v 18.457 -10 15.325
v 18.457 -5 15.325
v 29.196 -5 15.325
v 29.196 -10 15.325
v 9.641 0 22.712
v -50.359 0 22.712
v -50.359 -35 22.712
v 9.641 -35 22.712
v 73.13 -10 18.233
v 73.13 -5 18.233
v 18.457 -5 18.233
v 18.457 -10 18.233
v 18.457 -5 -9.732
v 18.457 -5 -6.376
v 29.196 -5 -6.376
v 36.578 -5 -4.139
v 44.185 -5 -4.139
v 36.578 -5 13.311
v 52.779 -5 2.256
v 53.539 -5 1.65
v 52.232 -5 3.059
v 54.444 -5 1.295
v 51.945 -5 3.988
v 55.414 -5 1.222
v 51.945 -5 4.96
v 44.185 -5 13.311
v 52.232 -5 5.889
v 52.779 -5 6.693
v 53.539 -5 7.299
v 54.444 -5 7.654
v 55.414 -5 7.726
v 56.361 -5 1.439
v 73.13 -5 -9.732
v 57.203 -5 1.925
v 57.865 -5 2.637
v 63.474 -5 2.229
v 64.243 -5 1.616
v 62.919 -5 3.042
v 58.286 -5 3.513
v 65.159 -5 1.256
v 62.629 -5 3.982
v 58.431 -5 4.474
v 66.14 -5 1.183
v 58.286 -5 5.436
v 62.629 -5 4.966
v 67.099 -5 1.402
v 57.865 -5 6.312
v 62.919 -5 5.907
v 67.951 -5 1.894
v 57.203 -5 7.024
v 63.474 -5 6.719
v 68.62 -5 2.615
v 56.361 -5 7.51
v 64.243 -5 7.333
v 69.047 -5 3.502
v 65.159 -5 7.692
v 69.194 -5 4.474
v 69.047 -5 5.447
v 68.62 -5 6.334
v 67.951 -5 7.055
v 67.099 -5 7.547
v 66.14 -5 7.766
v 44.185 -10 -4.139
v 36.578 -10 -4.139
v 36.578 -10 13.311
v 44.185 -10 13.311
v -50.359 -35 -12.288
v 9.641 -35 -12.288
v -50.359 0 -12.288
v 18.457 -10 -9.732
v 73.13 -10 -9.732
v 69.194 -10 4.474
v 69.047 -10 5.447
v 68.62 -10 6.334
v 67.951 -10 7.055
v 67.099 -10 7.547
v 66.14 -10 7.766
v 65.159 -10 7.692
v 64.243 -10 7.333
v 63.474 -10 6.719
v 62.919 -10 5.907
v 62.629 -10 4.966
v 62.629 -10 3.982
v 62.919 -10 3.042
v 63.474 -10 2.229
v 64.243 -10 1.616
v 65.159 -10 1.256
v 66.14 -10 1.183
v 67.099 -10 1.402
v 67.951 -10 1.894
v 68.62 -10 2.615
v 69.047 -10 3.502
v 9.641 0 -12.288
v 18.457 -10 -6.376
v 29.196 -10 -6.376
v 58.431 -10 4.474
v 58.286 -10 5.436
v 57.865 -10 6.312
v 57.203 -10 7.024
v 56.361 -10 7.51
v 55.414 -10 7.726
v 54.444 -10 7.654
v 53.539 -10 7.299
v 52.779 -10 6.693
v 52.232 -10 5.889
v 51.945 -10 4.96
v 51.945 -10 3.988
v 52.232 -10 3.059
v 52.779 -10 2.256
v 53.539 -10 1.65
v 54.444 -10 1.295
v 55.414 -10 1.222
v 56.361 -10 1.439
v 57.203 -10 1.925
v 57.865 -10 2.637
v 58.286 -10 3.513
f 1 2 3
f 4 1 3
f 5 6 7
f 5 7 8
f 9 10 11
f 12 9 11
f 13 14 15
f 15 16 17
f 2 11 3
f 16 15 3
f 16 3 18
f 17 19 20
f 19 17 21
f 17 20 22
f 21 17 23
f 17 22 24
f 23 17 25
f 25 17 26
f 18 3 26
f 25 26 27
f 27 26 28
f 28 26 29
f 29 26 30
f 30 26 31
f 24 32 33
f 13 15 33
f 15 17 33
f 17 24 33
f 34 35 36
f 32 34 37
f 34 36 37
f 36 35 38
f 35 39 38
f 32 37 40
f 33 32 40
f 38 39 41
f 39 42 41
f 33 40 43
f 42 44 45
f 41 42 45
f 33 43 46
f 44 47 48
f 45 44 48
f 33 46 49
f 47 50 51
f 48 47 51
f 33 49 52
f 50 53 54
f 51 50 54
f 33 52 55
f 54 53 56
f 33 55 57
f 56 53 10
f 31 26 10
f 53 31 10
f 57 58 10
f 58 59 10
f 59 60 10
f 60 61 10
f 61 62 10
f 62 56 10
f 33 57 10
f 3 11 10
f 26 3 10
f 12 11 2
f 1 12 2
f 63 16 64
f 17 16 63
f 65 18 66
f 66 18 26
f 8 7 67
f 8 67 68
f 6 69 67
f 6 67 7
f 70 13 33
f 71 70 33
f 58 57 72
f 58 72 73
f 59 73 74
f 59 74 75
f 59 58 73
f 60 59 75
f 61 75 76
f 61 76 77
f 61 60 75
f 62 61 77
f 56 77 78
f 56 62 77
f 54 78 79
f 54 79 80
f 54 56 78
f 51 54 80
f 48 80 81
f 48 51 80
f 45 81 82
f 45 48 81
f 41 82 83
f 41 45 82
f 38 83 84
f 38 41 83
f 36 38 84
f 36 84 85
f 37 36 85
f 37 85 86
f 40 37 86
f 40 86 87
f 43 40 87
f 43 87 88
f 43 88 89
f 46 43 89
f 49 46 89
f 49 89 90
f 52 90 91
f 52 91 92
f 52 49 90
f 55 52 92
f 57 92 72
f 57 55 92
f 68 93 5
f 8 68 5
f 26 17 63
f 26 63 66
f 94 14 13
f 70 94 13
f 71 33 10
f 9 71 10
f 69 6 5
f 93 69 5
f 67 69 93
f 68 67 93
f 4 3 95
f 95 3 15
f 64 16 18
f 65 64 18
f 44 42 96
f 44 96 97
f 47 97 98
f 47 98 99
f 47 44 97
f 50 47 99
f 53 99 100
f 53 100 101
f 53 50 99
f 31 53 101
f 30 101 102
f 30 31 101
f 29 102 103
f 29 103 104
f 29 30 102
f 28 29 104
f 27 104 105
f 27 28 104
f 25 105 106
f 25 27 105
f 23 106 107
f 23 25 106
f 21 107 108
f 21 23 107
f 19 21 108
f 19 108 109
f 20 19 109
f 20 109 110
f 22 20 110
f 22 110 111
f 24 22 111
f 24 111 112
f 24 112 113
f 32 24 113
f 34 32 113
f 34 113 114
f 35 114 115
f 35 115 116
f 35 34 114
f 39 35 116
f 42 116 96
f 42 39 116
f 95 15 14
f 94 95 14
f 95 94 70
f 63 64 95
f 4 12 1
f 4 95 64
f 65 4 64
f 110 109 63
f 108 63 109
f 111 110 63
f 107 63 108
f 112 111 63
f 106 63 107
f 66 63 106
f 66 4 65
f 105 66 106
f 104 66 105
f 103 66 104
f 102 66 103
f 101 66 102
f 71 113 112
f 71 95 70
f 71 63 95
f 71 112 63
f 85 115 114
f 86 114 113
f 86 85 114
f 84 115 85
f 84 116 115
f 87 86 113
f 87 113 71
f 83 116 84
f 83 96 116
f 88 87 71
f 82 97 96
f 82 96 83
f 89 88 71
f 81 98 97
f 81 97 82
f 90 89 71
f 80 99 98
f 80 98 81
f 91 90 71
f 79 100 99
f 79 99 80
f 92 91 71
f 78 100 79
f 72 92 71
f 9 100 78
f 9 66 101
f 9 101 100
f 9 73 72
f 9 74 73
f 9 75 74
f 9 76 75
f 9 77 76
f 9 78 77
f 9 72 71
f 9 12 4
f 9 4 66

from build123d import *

# Parameters (mm, degrees)
F0_W     = 60
F0_H     = 35
F1_DEPTH = 35
F3_W     = 7.606529
F3_H     = 17.450285
F3_R     = 3.261164
F3_R_2   = 3.300731
F4_DEPTH = 5


with BuildPart() as f1:
    # F0 (on Front) → F1 (new body)
    with BuildSketch(Plane.XZ):
        with Locations((-20.358665, 5.211844)):
            Rectangle(F0_W, F0_H)
    extrude(amount=F1_DEPTH)


with BuildPart() as f4:
    # F3 (on offset) → F4 (new body)
    with BuildSketch(Plane.XZ.offset(5)):
        Polygon((73.130138, 18.23331), (18.457033, 18.23331), (18.457033, 15.324929), (29.195668, 15.324929), (29.195668, -6.376065), (18.457033, -6.376065), (18.457033, -9.73189), (73.130138, -9.73189), align=None)
        with Locations((40.381749, 4.586292)):
            Rectangle(F3_W, F3_H, mode=Mode.SUBTRACT)
        with Locations((55.170059, 4.474432)):
            Circle(F3_R, mode=Mode.SUBTRACT)
        with Locations((65.893278, 4.474432)):
            Circle(F3_R_2, mode=Mode.SUBTRACT)
    extrude(amount=F4_DEPTH)


solid = Compound([f1.part, f4.part])
